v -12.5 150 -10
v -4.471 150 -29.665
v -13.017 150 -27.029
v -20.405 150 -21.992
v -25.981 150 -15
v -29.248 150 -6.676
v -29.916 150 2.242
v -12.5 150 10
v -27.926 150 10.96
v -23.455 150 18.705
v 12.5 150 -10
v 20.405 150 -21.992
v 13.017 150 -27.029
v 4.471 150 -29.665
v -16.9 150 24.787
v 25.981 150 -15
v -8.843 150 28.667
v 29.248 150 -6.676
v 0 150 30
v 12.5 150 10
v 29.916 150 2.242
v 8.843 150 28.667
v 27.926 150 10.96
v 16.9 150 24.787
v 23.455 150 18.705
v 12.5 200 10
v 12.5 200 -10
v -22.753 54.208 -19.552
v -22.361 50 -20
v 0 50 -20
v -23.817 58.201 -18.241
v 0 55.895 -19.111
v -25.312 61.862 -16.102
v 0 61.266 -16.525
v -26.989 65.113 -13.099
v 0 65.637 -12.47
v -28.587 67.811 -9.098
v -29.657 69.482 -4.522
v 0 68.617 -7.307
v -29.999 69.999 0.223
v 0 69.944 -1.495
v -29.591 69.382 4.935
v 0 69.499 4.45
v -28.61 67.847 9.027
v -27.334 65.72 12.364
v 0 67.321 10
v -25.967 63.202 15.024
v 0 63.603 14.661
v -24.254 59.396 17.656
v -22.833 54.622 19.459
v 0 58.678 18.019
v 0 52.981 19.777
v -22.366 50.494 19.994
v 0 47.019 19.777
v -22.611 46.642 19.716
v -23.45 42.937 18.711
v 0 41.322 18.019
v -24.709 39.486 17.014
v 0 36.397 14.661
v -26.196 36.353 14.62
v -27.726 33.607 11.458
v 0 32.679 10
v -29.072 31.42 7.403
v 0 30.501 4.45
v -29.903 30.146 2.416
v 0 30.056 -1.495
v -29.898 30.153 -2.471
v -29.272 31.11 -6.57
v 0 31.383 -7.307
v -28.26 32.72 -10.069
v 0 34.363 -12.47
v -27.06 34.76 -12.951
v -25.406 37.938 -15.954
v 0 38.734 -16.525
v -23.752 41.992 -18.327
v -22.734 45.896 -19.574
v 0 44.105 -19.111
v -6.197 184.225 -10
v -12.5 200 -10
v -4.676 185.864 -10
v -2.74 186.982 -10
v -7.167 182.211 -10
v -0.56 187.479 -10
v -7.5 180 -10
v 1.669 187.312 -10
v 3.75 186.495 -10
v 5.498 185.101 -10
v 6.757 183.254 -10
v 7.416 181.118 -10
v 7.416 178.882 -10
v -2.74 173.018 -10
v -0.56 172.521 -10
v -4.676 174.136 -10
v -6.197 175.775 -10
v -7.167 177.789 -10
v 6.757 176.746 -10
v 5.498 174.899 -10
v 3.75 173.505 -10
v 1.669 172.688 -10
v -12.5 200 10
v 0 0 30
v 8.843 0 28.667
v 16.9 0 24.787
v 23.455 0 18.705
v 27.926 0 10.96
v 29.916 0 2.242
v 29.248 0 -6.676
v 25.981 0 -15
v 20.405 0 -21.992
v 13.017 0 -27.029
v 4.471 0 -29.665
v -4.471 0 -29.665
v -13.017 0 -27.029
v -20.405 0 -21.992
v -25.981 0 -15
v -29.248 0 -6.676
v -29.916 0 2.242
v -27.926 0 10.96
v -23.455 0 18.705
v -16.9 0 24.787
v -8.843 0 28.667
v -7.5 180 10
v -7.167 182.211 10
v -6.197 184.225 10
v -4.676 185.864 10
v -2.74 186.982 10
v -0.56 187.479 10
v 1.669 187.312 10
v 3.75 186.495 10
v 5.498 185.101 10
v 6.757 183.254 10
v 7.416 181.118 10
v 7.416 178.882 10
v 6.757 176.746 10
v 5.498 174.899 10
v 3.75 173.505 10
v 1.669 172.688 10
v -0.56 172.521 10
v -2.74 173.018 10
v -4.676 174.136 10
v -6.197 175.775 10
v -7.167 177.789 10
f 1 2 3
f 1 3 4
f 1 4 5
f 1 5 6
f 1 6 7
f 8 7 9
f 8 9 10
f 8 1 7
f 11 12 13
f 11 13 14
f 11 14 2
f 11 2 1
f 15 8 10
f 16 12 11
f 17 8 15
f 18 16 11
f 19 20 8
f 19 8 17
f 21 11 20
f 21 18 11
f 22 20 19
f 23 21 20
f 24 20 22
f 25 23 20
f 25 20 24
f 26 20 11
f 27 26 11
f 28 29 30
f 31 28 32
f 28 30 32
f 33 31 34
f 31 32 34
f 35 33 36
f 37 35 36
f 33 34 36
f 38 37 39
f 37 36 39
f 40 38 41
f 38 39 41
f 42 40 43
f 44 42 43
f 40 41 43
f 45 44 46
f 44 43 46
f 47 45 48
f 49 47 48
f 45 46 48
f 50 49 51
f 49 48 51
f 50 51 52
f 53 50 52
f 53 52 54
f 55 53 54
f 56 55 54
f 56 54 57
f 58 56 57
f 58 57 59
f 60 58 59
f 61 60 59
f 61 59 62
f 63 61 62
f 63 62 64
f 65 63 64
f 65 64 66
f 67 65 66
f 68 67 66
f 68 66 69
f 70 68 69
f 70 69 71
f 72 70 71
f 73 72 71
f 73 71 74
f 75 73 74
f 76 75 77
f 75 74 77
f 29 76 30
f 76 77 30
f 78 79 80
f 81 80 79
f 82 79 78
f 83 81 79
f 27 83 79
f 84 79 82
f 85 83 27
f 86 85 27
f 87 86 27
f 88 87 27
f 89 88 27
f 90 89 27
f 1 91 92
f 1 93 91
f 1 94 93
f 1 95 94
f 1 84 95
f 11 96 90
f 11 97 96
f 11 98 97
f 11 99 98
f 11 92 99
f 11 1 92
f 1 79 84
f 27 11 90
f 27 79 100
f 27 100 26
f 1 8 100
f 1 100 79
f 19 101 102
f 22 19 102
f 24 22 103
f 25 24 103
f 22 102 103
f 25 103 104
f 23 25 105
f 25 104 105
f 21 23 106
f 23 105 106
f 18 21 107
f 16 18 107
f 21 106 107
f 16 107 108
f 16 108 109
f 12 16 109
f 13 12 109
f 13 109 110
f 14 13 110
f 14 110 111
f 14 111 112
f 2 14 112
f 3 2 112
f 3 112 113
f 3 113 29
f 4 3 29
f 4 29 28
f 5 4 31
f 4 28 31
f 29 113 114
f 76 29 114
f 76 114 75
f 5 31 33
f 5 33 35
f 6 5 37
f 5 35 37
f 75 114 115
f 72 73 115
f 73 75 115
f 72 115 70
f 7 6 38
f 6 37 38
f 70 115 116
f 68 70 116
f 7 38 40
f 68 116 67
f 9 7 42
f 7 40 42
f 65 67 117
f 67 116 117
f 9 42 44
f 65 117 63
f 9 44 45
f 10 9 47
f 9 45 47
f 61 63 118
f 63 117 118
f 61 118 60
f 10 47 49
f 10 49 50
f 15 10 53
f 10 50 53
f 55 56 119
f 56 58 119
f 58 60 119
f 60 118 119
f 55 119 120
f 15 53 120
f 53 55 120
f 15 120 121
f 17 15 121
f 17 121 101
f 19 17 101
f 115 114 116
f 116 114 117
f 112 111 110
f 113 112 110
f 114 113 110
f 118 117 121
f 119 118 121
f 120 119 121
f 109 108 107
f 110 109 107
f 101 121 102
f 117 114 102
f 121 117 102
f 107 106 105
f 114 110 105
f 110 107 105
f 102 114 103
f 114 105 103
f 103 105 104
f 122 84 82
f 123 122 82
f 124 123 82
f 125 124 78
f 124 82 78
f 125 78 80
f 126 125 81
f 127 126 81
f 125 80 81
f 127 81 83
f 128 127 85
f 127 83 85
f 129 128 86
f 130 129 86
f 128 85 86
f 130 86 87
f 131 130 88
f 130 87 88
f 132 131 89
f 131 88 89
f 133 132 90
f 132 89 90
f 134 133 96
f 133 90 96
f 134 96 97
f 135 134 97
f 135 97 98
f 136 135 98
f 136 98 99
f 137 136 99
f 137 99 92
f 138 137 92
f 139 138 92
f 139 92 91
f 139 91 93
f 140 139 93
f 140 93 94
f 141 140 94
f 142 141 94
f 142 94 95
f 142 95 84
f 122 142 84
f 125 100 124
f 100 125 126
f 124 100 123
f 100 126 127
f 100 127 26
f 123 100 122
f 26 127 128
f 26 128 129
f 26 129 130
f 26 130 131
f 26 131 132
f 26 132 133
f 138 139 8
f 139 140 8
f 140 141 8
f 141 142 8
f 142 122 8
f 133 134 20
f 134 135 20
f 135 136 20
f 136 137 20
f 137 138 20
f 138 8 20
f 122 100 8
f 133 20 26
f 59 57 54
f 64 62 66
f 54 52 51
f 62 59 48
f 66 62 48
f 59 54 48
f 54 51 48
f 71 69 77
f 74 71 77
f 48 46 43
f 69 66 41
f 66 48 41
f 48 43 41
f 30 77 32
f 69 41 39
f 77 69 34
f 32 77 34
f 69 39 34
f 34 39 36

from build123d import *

# Parameters (mm, degrees)
SKETCH2_R           = 30
BOSS_EXTRUDE1_DEPTH = 150
SKETCH3_R           = 20
CUT_EXTRUDE1_DEPTH  = 100
SKETCH4_W           = 25
SKETCH4_H           = 20
BOSS_EXTRUDE2_DEPTH = 50
SKETCH5_R           = 7.5
CUT_EXTRUDE2_DEPTH  = 40


with BuildPart() as part:
    # Sketch2 → Boss-Extrude1 (new body)
    with BuildSketch(Plane(origin=(0, 0, 0), x_dir=(1, 0, 0), z_dir=(0, 1, 0))):
        with Locations(Location((0, 0, 0), (0, 0, 270))):
            Circle(SKETCH2_R)
    extrude(amount=BOSS_EXTRUDE1_DEPTH)

    # Sketch3 → Cut-Extrude1 (cut)
    with BuildSketch(Plane(origin=(0, 0, 0), x_dir=(0, 0, -1), z_dir=(1, 0, 0))):
        with Locations((0, 50)):
            Circle(SKETCH3_R)
    extrude(amount=-CUT_EXTRUDE1_DEPTH, mode=Mode.SUBTRACT)

    # Sketch4 → Boss-Extrude2 (add)
    with BuildSketch(Plane(origin=(0, 150, 0), x_dir=(1, 0, 0), z_dir=(0, 1, 0))):
        Rectangle(SKETCH4_W, SKETCH4_H)
    extrude(amount=BOSS_EXTRUDE2_DEPTH)

    # Sketch5 → Cut-Extrude2 (cut)
    with BuildSketch(Plane(origin=(0, 0, -10), x_dir=(-1, 0, 0), z_dir=(0, 0, -1))):
        with Locations((0, 180)):
            Circle(SKETCH5_R)
    extrude(amount=-CUT_EXTRUDE2_DEPTH, mode=Mode.SUBTRACT)


solid = part.part
